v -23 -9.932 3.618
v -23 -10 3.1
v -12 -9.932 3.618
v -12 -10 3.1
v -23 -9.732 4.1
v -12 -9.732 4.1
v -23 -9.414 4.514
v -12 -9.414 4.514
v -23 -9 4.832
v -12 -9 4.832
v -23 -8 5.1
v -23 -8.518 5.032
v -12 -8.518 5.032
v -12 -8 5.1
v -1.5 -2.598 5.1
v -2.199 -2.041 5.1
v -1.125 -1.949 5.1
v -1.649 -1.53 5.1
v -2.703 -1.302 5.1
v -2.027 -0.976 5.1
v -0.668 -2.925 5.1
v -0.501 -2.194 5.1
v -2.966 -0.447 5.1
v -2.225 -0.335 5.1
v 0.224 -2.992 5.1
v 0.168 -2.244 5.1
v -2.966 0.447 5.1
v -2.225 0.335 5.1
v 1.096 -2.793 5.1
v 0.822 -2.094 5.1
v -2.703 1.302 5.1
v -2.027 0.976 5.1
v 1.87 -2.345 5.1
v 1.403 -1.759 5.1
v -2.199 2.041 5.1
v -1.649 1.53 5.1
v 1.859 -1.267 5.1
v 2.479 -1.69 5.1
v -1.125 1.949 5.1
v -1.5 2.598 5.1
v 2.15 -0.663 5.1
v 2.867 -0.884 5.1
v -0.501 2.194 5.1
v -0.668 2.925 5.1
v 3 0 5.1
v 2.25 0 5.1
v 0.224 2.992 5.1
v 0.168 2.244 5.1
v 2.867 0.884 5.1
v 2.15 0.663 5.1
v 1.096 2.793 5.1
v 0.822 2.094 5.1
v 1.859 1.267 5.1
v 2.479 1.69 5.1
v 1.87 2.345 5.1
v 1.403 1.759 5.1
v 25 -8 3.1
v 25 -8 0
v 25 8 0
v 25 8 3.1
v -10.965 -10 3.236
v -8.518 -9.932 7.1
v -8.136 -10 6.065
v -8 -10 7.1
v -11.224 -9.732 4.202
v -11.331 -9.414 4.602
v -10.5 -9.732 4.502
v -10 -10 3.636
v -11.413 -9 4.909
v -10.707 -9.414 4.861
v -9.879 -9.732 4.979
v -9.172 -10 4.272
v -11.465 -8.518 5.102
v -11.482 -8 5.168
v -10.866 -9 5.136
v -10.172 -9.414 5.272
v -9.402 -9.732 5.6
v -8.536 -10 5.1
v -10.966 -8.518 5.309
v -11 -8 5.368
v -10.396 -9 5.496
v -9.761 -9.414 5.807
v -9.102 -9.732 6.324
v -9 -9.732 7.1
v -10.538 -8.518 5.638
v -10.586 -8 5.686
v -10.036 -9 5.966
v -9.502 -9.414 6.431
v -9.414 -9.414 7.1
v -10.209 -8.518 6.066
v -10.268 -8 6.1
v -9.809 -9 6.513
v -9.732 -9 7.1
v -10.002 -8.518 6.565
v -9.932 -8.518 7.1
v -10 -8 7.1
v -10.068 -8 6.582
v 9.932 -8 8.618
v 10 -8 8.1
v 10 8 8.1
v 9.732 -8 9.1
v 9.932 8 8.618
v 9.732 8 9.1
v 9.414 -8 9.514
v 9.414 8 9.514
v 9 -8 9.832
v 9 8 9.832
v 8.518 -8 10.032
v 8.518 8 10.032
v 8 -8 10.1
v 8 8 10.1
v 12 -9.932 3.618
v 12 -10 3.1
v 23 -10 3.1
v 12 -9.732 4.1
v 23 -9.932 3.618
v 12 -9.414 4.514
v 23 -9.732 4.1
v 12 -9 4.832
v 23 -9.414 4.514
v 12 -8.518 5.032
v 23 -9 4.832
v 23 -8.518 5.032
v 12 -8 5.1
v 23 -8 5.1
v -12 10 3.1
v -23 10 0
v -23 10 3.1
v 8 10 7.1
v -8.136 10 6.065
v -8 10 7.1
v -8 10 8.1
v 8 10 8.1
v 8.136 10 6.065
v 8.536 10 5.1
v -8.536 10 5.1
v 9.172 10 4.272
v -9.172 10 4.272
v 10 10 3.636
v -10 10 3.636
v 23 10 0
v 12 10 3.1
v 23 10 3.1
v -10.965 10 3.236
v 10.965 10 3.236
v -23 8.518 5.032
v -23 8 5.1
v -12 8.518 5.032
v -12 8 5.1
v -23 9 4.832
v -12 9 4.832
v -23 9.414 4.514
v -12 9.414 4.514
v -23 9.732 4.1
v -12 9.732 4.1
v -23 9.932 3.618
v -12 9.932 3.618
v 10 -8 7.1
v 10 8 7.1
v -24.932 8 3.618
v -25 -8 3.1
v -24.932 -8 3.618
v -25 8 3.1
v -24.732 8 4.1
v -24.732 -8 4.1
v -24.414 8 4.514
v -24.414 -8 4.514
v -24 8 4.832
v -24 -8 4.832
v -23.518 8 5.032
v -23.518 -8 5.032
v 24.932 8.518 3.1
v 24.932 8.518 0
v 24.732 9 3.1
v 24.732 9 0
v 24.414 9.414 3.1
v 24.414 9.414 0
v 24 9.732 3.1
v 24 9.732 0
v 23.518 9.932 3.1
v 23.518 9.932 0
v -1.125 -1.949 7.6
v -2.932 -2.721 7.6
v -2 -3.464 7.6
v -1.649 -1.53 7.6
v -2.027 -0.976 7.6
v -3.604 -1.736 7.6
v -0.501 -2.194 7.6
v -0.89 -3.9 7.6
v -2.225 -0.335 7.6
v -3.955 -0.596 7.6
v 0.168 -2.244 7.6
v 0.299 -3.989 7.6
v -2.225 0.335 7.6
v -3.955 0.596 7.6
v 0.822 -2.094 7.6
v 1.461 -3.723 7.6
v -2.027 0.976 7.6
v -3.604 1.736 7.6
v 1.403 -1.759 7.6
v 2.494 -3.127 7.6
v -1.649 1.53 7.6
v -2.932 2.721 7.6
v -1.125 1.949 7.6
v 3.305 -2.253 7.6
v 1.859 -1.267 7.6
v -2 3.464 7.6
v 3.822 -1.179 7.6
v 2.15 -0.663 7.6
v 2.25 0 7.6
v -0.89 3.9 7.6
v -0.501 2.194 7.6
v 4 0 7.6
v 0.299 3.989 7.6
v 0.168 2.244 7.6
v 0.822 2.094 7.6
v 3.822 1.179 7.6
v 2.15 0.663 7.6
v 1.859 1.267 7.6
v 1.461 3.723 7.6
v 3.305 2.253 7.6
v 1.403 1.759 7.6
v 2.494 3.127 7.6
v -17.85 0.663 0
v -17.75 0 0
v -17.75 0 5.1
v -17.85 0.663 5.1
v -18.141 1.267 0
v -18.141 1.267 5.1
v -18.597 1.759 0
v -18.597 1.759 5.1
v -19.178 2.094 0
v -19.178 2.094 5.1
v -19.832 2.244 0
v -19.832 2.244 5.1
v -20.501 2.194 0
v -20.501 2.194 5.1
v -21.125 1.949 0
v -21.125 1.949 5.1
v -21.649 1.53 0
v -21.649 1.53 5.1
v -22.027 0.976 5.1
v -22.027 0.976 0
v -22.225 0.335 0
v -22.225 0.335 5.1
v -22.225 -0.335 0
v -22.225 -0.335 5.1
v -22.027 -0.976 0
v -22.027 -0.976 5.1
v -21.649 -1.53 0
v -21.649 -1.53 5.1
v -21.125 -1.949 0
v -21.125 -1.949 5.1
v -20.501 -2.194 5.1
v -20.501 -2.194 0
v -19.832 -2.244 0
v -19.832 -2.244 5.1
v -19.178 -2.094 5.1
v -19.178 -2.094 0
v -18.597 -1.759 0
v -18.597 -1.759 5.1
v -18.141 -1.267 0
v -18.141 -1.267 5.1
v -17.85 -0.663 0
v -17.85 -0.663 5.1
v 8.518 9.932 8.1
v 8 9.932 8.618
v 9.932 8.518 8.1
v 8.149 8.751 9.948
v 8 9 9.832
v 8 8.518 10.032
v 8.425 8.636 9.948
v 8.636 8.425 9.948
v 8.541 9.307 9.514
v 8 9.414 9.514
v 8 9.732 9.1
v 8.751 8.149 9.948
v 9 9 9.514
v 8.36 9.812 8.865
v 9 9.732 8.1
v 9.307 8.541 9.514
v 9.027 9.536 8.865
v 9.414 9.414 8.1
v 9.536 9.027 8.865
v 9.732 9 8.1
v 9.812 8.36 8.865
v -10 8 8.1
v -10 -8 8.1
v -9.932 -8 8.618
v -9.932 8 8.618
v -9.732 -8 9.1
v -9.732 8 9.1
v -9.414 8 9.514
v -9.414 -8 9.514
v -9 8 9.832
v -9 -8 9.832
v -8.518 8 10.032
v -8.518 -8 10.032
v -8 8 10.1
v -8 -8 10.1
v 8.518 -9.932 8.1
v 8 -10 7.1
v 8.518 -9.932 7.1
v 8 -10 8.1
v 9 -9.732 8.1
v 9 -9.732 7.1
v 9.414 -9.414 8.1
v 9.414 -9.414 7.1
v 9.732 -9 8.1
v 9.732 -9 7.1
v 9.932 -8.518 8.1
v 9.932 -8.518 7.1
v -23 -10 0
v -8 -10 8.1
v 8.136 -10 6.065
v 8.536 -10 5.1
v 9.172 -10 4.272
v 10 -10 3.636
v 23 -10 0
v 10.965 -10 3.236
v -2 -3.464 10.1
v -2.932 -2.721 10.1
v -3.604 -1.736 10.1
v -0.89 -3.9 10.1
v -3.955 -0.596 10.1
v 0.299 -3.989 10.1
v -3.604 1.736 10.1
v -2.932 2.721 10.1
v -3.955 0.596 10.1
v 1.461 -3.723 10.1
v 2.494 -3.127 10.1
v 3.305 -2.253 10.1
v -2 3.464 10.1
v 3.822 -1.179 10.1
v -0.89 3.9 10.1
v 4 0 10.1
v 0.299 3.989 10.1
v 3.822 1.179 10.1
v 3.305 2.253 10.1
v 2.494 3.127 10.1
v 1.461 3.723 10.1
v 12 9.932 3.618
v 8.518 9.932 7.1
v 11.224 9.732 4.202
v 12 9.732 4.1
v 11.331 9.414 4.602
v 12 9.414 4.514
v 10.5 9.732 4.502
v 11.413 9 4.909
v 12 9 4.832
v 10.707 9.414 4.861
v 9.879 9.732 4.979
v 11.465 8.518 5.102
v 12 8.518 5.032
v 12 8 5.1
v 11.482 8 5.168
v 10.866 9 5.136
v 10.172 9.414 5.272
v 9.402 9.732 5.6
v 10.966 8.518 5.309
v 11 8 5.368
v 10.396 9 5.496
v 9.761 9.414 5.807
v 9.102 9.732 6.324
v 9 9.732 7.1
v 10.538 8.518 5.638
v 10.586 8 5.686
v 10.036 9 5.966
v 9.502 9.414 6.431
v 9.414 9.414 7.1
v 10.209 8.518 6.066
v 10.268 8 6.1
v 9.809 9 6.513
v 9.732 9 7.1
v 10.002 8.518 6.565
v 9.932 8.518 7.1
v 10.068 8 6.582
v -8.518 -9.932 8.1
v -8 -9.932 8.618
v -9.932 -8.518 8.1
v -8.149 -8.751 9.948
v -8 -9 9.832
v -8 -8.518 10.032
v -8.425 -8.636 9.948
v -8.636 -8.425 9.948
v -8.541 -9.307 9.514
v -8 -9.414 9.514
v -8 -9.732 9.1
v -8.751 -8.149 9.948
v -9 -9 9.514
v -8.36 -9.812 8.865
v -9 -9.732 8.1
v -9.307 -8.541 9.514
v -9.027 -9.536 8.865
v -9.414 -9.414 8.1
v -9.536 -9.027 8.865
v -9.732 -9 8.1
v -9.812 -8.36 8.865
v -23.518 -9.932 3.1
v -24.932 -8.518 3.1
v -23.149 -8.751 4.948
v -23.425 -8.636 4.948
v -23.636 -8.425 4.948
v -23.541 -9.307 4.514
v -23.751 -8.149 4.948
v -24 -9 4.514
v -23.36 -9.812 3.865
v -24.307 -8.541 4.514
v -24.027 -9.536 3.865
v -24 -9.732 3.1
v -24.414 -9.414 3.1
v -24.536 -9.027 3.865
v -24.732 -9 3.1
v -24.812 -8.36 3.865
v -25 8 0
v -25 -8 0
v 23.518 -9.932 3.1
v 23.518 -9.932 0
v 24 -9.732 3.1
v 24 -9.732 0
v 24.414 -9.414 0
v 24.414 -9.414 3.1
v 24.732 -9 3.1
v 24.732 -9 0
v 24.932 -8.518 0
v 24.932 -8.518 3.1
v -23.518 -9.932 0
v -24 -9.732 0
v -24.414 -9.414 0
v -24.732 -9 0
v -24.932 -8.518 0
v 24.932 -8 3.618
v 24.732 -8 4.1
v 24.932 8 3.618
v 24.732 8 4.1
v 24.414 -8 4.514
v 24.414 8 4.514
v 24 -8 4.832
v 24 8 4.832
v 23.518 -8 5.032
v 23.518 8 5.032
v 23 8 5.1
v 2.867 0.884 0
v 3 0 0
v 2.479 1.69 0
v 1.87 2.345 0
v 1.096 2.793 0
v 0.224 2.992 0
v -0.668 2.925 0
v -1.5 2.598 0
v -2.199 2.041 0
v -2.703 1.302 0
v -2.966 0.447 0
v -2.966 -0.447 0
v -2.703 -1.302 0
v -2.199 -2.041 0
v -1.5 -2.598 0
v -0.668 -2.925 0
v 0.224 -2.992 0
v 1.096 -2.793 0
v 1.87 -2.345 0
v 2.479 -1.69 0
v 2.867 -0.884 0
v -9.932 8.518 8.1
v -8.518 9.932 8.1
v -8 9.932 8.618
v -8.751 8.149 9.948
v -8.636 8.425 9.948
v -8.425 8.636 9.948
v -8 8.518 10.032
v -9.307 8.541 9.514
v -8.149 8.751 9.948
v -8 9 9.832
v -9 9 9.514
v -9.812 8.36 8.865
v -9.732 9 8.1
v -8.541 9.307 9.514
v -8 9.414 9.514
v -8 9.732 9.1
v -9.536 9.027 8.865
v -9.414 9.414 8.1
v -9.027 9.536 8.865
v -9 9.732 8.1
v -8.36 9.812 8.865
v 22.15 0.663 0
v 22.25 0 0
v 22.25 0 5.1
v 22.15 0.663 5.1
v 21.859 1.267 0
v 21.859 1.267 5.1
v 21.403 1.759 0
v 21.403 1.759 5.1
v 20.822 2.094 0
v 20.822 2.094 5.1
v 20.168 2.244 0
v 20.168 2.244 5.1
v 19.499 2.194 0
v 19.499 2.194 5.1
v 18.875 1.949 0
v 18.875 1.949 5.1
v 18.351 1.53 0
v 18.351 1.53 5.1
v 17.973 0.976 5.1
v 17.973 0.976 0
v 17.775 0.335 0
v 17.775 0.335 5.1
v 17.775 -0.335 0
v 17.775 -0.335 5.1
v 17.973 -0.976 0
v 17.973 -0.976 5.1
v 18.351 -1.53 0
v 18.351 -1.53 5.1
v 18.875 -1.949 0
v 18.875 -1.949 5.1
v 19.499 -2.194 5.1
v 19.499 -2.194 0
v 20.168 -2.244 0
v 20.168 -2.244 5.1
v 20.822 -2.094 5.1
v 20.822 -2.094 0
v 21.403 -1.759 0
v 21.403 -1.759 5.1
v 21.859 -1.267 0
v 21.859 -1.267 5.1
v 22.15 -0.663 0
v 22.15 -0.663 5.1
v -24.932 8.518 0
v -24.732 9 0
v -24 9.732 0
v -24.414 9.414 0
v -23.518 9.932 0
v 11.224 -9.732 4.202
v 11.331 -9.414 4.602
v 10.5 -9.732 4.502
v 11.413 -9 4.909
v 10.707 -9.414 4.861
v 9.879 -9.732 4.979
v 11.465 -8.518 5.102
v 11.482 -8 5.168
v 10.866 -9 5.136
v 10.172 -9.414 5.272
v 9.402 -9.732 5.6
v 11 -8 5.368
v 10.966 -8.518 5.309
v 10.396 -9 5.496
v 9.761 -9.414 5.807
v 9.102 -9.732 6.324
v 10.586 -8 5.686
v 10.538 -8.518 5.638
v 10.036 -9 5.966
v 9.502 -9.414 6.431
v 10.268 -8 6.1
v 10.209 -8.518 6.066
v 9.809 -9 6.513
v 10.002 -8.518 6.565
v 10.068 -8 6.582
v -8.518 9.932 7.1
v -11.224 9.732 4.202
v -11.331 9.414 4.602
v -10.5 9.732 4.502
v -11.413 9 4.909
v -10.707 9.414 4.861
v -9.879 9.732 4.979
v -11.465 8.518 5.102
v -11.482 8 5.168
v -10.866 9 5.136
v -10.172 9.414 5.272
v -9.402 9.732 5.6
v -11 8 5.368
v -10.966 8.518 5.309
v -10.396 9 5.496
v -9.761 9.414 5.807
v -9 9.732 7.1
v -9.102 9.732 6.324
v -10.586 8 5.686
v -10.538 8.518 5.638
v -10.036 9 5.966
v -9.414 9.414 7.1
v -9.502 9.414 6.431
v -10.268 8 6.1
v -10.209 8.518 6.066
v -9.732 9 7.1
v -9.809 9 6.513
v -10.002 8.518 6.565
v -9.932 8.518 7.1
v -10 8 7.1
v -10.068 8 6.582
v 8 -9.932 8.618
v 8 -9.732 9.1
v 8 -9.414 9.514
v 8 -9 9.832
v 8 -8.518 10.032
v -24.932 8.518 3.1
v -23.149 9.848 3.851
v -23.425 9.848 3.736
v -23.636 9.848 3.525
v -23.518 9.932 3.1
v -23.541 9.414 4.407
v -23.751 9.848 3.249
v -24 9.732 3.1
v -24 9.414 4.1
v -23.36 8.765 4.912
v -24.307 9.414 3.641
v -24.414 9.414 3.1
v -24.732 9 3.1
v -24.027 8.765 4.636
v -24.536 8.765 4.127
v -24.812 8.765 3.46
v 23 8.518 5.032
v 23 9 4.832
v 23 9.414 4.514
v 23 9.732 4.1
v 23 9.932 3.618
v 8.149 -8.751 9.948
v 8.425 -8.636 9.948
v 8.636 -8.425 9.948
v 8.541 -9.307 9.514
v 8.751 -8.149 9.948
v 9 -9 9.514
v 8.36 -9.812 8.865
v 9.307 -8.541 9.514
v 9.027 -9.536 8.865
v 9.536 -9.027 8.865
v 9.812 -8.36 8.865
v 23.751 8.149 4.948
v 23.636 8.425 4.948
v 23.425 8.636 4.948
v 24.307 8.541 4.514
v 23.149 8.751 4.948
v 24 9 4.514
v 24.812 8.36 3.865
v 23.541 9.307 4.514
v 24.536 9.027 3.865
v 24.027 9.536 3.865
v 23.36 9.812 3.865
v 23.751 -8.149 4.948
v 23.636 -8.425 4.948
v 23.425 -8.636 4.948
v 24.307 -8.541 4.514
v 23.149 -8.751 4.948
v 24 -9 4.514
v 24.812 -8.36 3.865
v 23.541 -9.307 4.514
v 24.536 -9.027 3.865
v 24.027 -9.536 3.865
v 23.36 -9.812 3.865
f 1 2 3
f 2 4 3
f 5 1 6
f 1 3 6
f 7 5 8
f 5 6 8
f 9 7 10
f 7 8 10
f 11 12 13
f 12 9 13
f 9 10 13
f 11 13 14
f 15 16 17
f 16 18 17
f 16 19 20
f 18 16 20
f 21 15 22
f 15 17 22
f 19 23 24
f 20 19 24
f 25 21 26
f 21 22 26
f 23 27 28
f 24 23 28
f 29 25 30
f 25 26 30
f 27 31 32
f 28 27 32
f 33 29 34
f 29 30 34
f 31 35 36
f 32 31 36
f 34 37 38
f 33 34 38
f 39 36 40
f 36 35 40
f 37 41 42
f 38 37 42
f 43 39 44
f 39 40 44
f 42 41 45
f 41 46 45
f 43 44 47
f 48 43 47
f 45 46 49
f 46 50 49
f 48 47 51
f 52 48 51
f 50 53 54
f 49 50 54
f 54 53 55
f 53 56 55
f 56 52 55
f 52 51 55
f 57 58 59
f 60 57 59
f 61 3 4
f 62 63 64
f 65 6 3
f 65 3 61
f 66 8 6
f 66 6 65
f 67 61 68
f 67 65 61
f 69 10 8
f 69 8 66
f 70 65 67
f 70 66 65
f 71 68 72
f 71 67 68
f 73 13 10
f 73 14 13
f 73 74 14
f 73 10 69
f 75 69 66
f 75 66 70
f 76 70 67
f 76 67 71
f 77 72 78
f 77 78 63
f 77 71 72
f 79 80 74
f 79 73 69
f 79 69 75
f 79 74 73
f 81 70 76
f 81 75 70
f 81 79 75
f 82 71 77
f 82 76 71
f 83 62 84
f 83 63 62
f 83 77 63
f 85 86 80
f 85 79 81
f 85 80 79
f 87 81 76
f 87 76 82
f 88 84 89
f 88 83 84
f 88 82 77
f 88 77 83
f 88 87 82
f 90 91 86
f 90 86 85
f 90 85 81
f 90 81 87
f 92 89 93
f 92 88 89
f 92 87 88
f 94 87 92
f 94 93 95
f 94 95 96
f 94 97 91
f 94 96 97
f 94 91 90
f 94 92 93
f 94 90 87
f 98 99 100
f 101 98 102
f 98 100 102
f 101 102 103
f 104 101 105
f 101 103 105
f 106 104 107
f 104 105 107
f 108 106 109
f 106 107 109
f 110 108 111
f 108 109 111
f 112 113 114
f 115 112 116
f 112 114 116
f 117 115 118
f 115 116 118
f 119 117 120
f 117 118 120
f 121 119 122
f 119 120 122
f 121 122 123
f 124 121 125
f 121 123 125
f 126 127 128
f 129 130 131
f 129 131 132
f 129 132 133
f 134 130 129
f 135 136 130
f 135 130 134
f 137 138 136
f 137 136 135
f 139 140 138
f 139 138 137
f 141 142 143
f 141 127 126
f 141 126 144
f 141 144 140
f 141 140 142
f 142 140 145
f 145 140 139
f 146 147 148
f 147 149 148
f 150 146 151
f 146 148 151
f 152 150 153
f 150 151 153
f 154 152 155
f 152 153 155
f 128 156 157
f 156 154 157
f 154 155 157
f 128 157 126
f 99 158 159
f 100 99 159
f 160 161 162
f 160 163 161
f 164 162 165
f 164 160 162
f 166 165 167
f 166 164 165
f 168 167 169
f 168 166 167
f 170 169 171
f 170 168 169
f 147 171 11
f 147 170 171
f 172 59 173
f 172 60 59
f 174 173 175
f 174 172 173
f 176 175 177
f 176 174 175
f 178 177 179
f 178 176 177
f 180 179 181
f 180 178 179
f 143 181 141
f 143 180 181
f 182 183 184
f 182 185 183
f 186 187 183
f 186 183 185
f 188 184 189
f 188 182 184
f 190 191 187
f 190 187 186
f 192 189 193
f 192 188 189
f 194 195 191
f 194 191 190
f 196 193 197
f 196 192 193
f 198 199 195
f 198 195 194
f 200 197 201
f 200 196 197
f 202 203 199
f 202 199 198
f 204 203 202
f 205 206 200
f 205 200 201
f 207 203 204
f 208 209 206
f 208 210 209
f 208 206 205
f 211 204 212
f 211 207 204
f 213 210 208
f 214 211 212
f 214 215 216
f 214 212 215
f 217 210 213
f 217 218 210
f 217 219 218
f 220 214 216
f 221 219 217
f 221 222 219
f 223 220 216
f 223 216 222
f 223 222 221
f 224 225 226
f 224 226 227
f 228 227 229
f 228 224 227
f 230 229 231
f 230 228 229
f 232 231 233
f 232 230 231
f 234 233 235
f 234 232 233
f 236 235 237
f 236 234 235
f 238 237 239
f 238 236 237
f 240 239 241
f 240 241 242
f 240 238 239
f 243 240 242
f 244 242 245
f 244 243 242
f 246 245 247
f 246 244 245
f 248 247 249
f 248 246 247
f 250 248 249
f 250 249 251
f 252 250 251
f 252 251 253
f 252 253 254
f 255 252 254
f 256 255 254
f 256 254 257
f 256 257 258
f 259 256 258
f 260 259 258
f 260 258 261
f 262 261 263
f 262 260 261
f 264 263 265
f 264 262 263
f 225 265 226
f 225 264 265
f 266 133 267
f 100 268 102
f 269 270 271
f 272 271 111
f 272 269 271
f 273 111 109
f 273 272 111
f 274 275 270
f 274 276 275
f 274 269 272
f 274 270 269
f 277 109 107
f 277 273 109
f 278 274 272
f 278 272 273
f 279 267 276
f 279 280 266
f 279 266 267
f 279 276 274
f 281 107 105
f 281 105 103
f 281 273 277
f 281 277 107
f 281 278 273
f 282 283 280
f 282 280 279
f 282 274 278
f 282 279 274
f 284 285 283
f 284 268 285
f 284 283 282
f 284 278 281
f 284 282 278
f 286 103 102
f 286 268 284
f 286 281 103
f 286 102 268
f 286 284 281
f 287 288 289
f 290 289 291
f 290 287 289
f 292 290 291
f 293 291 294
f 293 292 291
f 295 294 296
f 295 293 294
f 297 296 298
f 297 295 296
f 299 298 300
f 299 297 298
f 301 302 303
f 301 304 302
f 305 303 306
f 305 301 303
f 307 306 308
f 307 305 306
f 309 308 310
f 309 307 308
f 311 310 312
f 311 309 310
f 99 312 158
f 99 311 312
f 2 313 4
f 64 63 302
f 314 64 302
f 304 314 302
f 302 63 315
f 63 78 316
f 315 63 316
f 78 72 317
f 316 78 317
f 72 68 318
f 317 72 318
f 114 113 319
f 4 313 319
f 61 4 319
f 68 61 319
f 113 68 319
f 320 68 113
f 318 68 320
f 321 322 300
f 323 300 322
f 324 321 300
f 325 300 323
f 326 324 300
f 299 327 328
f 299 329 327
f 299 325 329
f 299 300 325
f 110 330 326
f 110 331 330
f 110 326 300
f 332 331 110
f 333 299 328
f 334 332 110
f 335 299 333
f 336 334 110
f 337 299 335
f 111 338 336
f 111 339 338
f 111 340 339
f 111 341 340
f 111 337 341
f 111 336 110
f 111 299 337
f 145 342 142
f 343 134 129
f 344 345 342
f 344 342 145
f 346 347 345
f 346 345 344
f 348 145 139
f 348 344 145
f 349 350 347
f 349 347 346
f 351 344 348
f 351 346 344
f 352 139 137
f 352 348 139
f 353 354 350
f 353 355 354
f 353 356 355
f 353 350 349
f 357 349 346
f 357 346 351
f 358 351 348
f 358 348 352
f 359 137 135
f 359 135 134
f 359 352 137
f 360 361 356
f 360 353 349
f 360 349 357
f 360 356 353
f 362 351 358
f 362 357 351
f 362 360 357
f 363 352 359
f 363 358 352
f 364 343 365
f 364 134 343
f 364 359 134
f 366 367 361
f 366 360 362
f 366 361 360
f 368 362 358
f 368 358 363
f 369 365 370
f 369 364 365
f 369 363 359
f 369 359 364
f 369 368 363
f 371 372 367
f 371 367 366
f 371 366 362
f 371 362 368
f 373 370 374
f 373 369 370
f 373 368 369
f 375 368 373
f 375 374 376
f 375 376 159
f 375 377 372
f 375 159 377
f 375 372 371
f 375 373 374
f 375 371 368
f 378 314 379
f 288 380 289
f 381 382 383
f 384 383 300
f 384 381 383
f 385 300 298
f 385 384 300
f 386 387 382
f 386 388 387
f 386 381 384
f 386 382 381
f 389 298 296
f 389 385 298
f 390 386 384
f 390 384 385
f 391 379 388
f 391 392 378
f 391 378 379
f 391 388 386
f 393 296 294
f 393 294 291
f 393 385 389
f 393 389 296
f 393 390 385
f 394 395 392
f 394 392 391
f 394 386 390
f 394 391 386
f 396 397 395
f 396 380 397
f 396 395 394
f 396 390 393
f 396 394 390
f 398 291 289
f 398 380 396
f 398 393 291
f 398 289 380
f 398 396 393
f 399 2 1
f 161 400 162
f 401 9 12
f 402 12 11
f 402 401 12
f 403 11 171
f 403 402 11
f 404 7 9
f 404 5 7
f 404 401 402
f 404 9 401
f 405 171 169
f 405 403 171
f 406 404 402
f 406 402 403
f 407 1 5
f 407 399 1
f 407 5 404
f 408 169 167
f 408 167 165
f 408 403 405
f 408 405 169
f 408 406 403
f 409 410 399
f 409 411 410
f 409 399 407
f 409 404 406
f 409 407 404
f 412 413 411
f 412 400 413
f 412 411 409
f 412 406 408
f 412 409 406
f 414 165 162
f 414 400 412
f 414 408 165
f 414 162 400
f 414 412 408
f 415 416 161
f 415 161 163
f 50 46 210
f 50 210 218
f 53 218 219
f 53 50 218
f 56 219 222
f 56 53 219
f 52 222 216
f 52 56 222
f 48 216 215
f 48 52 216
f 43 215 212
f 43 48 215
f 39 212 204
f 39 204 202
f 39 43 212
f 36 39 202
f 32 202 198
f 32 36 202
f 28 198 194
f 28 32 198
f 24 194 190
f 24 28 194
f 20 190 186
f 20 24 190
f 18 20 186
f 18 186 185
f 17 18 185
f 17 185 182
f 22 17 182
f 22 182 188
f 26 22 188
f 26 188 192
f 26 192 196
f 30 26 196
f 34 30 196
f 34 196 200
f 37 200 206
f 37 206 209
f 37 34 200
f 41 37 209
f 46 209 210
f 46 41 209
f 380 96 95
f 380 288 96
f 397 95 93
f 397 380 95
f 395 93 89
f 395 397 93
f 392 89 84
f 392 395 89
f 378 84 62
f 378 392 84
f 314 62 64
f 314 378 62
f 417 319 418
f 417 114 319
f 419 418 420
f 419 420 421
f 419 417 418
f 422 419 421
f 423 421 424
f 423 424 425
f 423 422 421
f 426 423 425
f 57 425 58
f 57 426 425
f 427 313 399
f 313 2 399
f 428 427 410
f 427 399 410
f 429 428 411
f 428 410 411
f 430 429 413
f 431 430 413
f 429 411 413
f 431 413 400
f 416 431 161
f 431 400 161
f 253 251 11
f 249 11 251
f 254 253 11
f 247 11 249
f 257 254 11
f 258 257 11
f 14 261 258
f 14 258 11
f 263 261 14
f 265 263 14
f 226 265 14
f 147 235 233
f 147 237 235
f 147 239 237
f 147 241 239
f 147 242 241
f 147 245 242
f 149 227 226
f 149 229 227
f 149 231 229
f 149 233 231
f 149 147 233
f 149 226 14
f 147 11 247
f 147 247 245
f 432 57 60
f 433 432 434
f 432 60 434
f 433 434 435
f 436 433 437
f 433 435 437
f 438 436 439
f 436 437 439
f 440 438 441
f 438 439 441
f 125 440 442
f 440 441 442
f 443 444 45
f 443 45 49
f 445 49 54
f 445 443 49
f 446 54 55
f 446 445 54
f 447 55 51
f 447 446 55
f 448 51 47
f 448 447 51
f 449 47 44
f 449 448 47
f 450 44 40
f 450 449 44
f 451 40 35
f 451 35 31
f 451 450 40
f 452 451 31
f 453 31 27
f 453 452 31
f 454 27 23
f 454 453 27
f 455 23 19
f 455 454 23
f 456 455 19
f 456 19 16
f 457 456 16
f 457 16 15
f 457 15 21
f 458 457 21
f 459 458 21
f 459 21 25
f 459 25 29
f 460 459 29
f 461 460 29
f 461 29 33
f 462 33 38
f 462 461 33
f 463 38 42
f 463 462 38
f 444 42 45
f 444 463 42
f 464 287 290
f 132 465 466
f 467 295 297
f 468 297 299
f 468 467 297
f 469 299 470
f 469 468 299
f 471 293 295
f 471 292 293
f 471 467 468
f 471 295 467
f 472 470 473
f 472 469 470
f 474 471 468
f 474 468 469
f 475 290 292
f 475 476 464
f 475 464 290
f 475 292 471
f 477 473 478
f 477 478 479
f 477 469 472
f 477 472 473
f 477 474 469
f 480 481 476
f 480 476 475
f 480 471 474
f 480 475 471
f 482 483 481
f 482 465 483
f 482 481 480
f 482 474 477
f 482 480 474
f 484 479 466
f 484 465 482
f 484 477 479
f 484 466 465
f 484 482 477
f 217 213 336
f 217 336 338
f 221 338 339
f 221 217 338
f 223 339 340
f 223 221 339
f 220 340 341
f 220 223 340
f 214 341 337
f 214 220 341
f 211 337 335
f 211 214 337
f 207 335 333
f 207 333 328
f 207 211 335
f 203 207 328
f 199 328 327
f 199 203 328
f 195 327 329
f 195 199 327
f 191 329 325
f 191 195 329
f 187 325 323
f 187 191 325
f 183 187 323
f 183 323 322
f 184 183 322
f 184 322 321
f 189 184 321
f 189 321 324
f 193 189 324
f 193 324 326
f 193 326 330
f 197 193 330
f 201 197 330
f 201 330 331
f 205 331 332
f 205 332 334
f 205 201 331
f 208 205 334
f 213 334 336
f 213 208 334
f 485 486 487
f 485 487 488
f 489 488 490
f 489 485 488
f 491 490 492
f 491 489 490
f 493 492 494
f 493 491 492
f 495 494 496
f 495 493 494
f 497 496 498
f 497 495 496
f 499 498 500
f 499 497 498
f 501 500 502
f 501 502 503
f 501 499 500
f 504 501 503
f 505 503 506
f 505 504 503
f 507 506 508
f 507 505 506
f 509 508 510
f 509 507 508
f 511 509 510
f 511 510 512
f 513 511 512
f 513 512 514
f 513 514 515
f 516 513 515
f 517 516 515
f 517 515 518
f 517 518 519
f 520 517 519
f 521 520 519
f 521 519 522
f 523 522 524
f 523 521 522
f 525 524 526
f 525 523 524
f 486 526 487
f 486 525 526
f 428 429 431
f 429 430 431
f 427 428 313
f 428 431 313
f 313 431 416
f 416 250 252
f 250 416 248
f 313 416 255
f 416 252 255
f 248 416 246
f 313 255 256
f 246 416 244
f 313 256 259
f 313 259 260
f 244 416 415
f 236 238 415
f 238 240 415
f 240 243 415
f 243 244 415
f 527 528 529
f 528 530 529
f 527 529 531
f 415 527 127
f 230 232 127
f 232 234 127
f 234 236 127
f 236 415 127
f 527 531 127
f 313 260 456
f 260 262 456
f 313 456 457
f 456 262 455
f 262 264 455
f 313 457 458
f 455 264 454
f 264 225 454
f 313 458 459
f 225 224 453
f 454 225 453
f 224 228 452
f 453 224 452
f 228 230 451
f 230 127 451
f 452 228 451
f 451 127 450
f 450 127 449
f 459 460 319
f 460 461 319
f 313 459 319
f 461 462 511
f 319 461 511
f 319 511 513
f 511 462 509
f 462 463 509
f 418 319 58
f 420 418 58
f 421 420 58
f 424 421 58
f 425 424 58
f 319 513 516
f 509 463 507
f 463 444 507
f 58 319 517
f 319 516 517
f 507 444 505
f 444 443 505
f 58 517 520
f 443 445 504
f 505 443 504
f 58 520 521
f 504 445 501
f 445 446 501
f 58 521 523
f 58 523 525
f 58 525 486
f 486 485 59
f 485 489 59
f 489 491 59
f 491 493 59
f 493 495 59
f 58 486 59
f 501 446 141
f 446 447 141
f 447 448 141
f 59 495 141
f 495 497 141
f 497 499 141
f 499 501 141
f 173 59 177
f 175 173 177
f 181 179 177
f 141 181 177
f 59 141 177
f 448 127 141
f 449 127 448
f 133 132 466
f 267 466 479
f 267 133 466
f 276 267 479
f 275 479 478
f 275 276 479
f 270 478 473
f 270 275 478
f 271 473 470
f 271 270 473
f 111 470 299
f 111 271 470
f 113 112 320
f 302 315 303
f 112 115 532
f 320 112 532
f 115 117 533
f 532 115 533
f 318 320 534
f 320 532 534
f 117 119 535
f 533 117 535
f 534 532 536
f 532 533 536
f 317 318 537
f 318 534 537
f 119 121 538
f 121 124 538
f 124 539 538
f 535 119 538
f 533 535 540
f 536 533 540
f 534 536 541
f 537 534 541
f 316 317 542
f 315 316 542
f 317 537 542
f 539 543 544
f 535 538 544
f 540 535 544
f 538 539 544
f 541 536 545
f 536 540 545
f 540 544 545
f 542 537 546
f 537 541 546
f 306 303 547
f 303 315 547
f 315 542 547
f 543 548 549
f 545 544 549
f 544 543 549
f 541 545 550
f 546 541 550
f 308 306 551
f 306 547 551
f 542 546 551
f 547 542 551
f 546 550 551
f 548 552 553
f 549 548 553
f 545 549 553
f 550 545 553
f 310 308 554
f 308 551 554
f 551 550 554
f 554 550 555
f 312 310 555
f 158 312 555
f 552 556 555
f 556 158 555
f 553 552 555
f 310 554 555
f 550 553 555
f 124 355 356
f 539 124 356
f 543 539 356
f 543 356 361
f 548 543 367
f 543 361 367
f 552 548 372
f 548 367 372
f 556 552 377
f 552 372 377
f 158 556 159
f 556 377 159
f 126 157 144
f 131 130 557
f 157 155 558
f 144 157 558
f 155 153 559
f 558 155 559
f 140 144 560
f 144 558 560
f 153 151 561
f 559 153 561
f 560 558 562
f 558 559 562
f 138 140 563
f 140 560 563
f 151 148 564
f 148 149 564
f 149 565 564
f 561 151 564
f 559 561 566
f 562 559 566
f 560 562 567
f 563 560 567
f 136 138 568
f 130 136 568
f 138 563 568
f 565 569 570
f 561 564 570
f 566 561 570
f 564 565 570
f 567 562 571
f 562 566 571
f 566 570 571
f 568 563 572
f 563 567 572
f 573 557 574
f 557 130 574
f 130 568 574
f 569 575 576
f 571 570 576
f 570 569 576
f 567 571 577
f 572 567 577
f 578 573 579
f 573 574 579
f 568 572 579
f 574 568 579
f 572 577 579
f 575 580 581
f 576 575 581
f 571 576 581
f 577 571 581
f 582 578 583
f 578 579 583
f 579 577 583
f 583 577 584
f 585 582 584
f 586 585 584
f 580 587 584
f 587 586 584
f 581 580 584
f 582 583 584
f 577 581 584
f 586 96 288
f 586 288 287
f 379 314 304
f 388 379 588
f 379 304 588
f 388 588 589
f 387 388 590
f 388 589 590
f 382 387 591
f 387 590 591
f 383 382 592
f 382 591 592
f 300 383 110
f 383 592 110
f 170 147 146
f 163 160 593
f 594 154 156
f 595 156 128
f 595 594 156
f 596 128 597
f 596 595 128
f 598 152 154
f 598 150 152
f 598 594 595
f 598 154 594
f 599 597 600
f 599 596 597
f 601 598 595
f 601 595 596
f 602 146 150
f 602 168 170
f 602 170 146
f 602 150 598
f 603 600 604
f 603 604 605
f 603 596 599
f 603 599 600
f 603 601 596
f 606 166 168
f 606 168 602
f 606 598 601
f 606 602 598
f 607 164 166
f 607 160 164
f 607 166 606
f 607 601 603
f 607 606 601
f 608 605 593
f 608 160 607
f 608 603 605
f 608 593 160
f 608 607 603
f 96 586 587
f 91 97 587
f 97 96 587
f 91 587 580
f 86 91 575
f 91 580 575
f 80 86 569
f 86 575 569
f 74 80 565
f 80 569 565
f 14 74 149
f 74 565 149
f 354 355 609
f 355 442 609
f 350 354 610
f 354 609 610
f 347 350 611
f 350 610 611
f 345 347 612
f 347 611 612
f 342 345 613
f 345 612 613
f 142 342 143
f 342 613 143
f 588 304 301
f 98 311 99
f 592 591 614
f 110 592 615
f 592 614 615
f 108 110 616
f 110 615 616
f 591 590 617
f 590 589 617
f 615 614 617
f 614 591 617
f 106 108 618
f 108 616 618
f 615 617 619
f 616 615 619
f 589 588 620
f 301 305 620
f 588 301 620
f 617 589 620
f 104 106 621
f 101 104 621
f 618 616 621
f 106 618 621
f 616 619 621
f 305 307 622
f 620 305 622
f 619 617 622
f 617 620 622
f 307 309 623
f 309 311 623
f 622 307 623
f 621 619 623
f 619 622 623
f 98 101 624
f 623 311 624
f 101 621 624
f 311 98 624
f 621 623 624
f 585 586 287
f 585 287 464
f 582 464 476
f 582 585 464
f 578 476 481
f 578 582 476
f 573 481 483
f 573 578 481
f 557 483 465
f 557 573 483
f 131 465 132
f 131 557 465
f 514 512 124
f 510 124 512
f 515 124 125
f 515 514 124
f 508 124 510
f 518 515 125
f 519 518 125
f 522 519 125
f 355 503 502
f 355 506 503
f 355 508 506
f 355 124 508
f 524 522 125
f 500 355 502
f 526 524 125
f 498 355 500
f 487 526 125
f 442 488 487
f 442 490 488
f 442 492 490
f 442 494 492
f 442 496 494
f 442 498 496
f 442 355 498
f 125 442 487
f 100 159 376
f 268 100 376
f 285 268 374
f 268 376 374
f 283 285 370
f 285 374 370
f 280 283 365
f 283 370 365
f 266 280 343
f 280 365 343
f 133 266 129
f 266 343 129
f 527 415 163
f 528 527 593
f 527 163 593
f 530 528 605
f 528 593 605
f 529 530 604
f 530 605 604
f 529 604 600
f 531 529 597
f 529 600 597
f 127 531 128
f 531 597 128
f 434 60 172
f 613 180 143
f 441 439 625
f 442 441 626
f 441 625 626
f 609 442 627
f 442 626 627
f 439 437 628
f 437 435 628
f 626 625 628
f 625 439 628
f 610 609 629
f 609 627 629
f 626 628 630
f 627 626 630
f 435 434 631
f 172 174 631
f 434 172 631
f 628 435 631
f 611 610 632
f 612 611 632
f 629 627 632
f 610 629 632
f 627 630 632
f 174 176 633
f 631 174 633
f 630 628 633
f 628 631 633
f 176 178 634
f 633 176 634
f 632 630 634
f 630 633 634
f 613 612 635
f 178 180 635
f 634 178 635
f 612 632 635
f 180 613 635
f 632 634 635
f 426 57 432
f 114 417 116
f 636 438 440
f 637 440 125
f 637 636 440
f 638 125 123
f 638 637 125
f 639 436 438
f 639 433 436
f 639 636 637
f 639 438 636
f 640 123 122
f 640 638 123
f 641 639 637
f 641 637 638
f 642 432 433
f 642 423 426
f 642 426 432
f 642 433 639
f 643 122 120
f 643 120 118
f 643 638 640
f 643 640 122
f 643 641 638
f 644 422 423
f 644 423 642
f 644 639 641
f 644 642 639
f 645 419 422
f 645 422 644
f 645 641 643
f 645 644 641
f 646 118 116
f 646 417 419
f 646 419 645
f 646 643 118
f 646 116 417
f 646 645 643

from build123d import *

# Parameters (mm, degrees)
F0_W     = 50
F0_H     = 20
F0_R     = 2.25
F0_R_2   = 4
F0_R_3   = 3
F1_DEPTH = 5.1
F2_W     = 20
F2_H     = 20
F2_R     = 3
F2_R_2   = 2.25
F3_DEPTH = 2.5
F4_W     = 20
F4_H     = 20
F4_R     = 4
F5_DEPTH = 2.5
F6_R     = 2


# Not quite as in the source:
# - a feature names something its author has since deleted; it is built from what else it names


with BuildPart() as f1:
    # F0 (on Top) → F1 (new body)
    with BuildSketch(Plane.XY):
        Rectangle(F0_W, F0_H)
        with Locations((-20, 0)):
            Circle(F0_R, mode=Mode.SUBTRACT)
        Circle(F0_R_2, mode=Mode.SUBTRACT)
        with Locations((20, 0)):
            Circle(F0_R, mode=Mode.SUBTRACT)
        Circle(F0_R_2)
        Circle(F0_R_3, mode=Mode.SUBTRACT)
    extrude(amount=F1_DEPTH)

    # F2 (on face) → F3 (join)
    with BuildSketch(Plane.XY.offset(5.1)):
        Rectangle(F2_W, F2_H)
        Circle(F2_R, mode=Mode.SUBTRACT)
        Circle(F2_R)
        Circle(F2_R_2, mode=Mode.SUBTRACT)
    extrude(amount=F3_DEPTH)

    # F4 (on face) → F5 (join)
    with BuildSketch(Plane.XY.offset(7.6)):
        Rectangle(F4_W, F4_H)
        Circle(F4_R, mode=Mode.SUBTRACT)
    extrude(amount=F5_DEPTH)

    # F6
    f6_edges = [f1.edges().sort_by_distance(p)[0] for p in [
        (-25, -10, 2.55),
        (25, -10, 2.55),
        (25, 10, 2.55),
        (25, 0, 5.1),
        (17.5, -10, 5.1),
        (17.5, 10, 5.1),
        (-17.5, -10, 5.1),
        (-25, 0, 5.1),
        (-17.5, 10, 5.1),
        (-25, 10, 2.55),
        (10, -10, 7.6),
        (10, 10, 7.6),
        (-10, -10, 7.6),
        (-10, 10, 7.6),
        (10, 0, 5.1),
        (-10, 0, 5.1),
        (0, -10, 10.1),
        (-10, 0, 10.1),
        (0, 10, 10.1),
        (10, 0, 10.1),
    ]]
    fillet(f6_edges, radius=F6_R)


solid = f1.part
